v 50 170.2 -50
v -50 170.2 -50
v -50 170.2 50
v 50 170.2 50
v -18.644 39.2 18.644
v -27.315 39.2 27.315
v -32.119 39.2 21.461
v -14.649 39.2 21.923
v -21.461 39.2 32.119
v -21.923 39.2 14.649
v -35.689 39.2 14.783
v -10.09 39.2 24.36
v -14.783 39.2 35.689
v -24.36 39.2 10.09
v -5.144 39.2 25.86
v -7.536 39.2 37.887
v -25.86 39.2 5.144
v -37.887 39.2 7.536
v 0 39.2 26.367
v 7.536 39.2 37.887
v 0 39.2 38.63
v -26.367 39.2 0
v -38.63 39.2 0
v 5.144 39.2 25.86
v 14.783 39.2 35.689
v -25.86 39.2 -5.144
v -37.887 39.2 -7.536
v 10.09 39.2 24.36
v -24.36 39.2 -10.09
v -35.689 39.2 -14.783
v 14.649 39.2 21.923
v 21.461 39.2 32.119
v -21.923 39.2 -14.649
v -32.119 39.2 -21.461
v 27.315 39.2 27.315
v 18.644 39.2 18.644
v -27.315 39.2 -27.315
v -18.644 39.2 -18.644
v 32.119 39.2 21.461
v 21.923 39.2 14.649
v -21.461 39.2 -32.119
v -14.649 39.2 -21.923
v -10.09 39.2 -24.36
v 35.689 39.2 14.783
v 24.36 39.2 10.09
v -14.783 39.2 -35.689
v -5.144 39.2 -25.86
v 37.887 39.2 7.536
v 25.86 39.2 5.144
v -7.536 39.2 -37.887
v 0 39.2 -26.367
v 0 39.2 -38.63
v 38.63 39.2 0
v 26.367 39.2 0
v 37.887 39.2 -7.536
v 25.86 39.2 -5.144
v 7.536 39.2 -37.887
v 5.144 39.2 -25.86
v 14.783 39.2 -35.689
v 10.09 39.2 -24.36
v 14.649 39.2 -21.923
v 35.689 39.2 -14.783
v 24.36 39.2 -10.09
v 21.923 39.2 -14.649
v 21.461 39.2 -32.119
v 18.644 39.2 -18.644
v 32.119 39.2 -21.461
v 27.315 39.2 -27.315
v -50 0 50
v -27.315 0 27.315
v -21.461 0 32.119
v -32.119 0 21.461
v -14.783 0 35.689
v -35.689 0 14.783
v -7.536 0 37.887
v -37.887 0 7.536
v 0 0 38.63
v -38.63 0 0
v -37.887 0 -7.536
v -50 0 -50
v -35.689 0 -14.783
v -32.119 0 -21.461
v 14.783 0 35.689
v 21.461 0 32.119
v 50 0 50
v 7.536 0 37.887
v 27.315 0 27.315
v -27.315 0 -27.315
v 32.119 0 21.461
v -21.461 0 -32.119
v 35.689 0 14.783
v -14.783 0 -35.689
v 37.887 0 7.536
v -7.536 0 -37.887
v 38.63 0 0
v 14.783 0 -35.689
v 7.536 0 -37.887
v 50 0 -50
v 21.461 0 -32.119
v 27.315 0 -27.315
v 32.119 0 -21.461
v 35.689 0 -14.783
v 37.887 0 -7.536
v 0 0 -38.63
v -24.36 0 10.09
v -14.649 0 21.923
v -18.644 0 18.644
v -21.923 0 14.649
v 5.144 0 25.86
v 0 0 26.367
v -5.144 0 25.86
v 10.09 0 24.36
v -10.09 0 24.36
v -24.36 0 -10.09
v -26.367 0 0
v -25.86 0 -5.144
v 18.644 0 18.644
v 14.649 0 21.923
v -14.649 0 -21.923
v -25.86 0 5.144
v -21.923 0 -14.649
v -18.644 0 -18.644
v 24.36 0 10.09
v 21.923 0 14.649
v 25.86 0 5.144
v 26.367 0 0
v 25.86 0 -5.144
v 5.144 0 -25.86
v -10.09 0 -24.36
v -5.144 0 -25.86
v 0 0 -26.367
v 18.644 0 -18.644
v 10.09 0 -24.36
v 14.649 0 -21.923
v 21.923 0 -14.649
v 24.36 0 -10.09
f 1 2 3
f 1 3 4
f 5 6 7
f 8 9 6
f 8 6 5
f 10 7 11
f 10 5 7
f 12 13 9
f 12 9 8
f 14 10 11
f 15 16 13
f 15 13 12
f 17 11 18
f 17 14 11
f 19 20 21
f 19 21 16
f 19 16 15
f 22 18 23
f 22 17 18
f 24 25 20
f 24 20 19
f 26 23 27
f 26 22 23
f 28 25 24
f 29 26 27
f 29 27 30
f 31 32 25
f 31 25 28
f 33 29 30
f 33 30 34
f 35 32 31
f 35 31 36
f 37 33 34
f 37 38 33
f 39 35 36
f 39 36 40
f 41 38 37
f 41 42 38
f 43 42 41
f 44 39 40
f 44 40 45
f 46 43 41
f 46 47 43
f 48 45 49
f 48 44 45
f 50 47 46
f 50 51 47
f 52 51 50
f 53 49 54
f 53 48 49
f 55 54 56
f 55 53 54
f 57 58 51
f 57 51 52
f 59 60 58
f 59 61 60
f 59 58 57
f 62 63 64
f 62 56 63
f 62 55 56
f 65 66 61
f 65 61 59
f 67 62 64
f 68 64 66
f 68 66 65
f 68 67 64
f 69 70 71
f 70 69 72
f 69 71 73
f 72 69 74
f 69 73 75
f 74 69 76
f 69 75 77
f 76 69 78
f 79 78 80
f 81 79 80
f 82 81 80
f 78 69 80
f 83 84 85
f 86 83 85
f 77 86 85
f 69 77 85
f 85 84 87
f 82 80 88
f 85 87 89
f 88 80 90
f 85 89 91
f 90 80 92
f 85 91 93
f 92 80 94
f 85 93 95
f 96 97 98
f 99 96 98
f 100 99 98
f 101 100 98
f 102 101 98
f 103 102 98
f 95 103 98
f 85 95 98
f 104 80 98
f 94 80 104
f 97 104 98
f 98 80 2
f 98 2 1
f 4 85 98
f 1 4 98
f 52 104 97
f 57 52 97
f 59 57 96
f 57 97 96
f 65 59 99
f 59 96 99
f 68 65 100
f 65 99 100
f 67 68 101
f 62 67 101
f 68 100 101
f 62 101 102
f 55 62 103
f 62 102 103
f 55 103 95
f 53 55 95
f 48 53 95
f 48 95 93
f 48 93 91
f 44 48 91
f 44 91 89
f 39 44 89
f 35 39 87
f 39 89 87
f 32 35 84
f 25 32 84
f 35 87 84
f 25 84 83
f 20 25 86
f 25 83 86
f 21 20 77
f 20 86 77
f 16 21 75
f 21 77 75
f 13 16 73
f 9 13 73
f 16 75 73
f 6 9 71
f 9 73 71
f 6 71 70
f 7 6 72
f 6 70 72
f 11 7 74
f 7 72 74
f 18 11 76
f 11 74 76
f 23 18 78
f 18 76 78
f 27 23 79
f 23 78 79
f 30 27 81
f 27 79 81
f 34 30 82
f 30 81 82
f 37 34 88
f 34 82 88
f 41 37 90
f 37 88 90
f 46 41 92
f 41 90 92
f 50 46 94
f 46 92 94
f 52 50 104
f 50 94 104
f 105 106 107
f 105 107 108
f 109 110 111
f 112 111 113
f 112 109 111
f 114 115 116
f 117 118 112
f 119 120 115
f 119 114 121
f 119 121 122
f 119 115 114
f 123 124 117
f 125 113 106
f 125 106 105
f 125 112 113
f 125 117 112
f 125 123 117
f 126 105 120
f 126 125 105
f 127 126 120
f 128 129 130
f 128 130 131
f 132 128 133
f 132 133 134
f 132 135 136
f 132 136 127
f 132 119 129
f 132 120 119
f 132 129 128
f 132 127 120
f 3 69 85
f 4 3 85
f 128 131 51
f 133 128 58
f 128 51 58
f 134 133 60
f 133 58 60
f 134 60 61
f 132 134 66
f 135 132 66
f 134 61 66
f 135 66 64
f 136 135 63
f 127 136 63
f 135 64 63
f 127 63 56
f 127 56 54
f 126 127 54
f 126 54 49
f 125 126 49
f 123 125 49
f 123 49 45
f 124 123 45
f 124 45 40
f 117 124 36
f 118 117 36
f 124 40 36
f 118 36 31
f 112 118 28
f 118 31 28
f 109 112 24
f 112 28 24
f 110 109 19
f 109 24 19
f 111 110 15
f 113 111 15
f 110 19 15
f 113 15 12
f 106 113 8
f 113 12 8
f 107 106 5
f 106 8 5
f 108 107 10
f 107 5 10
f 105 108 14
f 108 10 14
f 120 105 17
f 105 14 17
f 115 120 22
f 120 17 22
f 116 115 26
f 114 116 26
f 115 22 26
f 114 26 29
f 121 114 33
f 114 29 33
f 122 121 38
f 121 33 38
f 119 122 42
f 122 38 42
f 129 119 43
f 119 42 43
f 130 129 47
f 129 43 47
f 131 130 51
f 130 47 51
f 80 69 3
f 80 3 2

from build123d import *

# Parameters (mm, degrees)
SKETCH1_W           = 100
SKETCH1_H           = 100
BOSS_EXTRUDE1_DEPTH = 170.2
SKETCH2_R           = 38.629656057
CUT_EXTRUDE1_DEPTH  = 39.2
SKETCH3_R           = 26.36678746
BOSS_EXTRUDE2_DEPTH = 39.2


with BuildPart() as part:
    # Sketch1 → Boss-Extrude1 (new body)
    with BuildSketch(Plane(origin=(0, 0, 0), x_dir=(1, 0, 0), z_dir=(0, 1, 0))):
        Rectangle(SKETCH1_W, SKETCH1_H)
    extrude(amount=BOSS_EXTRUDE1_DEPTH)

    # Sketch2 → Cut-Extrude1 (cut)
    with BuildSketch(Plane.XZ):
        with Locations(Location((0, 0, 0), (0, 0, 270))):
            Circle(SKETCH2_R)
    extrude(amount=-CUT_EXTRUDE1_DEPTH, mode=Mode.SUBTRACT)

    # Sketch3 → Boss-Extrude2 (add)
    with BuildSketch(Plane.XZ.offset(-39.2)):
        with Locations(Location((0, 0, 0), (0, 0, 270))):
            Circle(SKETCH3_R)
    extrude(amount=BOSS_EXTRUDE2_DEPTH)


solid = part.part
